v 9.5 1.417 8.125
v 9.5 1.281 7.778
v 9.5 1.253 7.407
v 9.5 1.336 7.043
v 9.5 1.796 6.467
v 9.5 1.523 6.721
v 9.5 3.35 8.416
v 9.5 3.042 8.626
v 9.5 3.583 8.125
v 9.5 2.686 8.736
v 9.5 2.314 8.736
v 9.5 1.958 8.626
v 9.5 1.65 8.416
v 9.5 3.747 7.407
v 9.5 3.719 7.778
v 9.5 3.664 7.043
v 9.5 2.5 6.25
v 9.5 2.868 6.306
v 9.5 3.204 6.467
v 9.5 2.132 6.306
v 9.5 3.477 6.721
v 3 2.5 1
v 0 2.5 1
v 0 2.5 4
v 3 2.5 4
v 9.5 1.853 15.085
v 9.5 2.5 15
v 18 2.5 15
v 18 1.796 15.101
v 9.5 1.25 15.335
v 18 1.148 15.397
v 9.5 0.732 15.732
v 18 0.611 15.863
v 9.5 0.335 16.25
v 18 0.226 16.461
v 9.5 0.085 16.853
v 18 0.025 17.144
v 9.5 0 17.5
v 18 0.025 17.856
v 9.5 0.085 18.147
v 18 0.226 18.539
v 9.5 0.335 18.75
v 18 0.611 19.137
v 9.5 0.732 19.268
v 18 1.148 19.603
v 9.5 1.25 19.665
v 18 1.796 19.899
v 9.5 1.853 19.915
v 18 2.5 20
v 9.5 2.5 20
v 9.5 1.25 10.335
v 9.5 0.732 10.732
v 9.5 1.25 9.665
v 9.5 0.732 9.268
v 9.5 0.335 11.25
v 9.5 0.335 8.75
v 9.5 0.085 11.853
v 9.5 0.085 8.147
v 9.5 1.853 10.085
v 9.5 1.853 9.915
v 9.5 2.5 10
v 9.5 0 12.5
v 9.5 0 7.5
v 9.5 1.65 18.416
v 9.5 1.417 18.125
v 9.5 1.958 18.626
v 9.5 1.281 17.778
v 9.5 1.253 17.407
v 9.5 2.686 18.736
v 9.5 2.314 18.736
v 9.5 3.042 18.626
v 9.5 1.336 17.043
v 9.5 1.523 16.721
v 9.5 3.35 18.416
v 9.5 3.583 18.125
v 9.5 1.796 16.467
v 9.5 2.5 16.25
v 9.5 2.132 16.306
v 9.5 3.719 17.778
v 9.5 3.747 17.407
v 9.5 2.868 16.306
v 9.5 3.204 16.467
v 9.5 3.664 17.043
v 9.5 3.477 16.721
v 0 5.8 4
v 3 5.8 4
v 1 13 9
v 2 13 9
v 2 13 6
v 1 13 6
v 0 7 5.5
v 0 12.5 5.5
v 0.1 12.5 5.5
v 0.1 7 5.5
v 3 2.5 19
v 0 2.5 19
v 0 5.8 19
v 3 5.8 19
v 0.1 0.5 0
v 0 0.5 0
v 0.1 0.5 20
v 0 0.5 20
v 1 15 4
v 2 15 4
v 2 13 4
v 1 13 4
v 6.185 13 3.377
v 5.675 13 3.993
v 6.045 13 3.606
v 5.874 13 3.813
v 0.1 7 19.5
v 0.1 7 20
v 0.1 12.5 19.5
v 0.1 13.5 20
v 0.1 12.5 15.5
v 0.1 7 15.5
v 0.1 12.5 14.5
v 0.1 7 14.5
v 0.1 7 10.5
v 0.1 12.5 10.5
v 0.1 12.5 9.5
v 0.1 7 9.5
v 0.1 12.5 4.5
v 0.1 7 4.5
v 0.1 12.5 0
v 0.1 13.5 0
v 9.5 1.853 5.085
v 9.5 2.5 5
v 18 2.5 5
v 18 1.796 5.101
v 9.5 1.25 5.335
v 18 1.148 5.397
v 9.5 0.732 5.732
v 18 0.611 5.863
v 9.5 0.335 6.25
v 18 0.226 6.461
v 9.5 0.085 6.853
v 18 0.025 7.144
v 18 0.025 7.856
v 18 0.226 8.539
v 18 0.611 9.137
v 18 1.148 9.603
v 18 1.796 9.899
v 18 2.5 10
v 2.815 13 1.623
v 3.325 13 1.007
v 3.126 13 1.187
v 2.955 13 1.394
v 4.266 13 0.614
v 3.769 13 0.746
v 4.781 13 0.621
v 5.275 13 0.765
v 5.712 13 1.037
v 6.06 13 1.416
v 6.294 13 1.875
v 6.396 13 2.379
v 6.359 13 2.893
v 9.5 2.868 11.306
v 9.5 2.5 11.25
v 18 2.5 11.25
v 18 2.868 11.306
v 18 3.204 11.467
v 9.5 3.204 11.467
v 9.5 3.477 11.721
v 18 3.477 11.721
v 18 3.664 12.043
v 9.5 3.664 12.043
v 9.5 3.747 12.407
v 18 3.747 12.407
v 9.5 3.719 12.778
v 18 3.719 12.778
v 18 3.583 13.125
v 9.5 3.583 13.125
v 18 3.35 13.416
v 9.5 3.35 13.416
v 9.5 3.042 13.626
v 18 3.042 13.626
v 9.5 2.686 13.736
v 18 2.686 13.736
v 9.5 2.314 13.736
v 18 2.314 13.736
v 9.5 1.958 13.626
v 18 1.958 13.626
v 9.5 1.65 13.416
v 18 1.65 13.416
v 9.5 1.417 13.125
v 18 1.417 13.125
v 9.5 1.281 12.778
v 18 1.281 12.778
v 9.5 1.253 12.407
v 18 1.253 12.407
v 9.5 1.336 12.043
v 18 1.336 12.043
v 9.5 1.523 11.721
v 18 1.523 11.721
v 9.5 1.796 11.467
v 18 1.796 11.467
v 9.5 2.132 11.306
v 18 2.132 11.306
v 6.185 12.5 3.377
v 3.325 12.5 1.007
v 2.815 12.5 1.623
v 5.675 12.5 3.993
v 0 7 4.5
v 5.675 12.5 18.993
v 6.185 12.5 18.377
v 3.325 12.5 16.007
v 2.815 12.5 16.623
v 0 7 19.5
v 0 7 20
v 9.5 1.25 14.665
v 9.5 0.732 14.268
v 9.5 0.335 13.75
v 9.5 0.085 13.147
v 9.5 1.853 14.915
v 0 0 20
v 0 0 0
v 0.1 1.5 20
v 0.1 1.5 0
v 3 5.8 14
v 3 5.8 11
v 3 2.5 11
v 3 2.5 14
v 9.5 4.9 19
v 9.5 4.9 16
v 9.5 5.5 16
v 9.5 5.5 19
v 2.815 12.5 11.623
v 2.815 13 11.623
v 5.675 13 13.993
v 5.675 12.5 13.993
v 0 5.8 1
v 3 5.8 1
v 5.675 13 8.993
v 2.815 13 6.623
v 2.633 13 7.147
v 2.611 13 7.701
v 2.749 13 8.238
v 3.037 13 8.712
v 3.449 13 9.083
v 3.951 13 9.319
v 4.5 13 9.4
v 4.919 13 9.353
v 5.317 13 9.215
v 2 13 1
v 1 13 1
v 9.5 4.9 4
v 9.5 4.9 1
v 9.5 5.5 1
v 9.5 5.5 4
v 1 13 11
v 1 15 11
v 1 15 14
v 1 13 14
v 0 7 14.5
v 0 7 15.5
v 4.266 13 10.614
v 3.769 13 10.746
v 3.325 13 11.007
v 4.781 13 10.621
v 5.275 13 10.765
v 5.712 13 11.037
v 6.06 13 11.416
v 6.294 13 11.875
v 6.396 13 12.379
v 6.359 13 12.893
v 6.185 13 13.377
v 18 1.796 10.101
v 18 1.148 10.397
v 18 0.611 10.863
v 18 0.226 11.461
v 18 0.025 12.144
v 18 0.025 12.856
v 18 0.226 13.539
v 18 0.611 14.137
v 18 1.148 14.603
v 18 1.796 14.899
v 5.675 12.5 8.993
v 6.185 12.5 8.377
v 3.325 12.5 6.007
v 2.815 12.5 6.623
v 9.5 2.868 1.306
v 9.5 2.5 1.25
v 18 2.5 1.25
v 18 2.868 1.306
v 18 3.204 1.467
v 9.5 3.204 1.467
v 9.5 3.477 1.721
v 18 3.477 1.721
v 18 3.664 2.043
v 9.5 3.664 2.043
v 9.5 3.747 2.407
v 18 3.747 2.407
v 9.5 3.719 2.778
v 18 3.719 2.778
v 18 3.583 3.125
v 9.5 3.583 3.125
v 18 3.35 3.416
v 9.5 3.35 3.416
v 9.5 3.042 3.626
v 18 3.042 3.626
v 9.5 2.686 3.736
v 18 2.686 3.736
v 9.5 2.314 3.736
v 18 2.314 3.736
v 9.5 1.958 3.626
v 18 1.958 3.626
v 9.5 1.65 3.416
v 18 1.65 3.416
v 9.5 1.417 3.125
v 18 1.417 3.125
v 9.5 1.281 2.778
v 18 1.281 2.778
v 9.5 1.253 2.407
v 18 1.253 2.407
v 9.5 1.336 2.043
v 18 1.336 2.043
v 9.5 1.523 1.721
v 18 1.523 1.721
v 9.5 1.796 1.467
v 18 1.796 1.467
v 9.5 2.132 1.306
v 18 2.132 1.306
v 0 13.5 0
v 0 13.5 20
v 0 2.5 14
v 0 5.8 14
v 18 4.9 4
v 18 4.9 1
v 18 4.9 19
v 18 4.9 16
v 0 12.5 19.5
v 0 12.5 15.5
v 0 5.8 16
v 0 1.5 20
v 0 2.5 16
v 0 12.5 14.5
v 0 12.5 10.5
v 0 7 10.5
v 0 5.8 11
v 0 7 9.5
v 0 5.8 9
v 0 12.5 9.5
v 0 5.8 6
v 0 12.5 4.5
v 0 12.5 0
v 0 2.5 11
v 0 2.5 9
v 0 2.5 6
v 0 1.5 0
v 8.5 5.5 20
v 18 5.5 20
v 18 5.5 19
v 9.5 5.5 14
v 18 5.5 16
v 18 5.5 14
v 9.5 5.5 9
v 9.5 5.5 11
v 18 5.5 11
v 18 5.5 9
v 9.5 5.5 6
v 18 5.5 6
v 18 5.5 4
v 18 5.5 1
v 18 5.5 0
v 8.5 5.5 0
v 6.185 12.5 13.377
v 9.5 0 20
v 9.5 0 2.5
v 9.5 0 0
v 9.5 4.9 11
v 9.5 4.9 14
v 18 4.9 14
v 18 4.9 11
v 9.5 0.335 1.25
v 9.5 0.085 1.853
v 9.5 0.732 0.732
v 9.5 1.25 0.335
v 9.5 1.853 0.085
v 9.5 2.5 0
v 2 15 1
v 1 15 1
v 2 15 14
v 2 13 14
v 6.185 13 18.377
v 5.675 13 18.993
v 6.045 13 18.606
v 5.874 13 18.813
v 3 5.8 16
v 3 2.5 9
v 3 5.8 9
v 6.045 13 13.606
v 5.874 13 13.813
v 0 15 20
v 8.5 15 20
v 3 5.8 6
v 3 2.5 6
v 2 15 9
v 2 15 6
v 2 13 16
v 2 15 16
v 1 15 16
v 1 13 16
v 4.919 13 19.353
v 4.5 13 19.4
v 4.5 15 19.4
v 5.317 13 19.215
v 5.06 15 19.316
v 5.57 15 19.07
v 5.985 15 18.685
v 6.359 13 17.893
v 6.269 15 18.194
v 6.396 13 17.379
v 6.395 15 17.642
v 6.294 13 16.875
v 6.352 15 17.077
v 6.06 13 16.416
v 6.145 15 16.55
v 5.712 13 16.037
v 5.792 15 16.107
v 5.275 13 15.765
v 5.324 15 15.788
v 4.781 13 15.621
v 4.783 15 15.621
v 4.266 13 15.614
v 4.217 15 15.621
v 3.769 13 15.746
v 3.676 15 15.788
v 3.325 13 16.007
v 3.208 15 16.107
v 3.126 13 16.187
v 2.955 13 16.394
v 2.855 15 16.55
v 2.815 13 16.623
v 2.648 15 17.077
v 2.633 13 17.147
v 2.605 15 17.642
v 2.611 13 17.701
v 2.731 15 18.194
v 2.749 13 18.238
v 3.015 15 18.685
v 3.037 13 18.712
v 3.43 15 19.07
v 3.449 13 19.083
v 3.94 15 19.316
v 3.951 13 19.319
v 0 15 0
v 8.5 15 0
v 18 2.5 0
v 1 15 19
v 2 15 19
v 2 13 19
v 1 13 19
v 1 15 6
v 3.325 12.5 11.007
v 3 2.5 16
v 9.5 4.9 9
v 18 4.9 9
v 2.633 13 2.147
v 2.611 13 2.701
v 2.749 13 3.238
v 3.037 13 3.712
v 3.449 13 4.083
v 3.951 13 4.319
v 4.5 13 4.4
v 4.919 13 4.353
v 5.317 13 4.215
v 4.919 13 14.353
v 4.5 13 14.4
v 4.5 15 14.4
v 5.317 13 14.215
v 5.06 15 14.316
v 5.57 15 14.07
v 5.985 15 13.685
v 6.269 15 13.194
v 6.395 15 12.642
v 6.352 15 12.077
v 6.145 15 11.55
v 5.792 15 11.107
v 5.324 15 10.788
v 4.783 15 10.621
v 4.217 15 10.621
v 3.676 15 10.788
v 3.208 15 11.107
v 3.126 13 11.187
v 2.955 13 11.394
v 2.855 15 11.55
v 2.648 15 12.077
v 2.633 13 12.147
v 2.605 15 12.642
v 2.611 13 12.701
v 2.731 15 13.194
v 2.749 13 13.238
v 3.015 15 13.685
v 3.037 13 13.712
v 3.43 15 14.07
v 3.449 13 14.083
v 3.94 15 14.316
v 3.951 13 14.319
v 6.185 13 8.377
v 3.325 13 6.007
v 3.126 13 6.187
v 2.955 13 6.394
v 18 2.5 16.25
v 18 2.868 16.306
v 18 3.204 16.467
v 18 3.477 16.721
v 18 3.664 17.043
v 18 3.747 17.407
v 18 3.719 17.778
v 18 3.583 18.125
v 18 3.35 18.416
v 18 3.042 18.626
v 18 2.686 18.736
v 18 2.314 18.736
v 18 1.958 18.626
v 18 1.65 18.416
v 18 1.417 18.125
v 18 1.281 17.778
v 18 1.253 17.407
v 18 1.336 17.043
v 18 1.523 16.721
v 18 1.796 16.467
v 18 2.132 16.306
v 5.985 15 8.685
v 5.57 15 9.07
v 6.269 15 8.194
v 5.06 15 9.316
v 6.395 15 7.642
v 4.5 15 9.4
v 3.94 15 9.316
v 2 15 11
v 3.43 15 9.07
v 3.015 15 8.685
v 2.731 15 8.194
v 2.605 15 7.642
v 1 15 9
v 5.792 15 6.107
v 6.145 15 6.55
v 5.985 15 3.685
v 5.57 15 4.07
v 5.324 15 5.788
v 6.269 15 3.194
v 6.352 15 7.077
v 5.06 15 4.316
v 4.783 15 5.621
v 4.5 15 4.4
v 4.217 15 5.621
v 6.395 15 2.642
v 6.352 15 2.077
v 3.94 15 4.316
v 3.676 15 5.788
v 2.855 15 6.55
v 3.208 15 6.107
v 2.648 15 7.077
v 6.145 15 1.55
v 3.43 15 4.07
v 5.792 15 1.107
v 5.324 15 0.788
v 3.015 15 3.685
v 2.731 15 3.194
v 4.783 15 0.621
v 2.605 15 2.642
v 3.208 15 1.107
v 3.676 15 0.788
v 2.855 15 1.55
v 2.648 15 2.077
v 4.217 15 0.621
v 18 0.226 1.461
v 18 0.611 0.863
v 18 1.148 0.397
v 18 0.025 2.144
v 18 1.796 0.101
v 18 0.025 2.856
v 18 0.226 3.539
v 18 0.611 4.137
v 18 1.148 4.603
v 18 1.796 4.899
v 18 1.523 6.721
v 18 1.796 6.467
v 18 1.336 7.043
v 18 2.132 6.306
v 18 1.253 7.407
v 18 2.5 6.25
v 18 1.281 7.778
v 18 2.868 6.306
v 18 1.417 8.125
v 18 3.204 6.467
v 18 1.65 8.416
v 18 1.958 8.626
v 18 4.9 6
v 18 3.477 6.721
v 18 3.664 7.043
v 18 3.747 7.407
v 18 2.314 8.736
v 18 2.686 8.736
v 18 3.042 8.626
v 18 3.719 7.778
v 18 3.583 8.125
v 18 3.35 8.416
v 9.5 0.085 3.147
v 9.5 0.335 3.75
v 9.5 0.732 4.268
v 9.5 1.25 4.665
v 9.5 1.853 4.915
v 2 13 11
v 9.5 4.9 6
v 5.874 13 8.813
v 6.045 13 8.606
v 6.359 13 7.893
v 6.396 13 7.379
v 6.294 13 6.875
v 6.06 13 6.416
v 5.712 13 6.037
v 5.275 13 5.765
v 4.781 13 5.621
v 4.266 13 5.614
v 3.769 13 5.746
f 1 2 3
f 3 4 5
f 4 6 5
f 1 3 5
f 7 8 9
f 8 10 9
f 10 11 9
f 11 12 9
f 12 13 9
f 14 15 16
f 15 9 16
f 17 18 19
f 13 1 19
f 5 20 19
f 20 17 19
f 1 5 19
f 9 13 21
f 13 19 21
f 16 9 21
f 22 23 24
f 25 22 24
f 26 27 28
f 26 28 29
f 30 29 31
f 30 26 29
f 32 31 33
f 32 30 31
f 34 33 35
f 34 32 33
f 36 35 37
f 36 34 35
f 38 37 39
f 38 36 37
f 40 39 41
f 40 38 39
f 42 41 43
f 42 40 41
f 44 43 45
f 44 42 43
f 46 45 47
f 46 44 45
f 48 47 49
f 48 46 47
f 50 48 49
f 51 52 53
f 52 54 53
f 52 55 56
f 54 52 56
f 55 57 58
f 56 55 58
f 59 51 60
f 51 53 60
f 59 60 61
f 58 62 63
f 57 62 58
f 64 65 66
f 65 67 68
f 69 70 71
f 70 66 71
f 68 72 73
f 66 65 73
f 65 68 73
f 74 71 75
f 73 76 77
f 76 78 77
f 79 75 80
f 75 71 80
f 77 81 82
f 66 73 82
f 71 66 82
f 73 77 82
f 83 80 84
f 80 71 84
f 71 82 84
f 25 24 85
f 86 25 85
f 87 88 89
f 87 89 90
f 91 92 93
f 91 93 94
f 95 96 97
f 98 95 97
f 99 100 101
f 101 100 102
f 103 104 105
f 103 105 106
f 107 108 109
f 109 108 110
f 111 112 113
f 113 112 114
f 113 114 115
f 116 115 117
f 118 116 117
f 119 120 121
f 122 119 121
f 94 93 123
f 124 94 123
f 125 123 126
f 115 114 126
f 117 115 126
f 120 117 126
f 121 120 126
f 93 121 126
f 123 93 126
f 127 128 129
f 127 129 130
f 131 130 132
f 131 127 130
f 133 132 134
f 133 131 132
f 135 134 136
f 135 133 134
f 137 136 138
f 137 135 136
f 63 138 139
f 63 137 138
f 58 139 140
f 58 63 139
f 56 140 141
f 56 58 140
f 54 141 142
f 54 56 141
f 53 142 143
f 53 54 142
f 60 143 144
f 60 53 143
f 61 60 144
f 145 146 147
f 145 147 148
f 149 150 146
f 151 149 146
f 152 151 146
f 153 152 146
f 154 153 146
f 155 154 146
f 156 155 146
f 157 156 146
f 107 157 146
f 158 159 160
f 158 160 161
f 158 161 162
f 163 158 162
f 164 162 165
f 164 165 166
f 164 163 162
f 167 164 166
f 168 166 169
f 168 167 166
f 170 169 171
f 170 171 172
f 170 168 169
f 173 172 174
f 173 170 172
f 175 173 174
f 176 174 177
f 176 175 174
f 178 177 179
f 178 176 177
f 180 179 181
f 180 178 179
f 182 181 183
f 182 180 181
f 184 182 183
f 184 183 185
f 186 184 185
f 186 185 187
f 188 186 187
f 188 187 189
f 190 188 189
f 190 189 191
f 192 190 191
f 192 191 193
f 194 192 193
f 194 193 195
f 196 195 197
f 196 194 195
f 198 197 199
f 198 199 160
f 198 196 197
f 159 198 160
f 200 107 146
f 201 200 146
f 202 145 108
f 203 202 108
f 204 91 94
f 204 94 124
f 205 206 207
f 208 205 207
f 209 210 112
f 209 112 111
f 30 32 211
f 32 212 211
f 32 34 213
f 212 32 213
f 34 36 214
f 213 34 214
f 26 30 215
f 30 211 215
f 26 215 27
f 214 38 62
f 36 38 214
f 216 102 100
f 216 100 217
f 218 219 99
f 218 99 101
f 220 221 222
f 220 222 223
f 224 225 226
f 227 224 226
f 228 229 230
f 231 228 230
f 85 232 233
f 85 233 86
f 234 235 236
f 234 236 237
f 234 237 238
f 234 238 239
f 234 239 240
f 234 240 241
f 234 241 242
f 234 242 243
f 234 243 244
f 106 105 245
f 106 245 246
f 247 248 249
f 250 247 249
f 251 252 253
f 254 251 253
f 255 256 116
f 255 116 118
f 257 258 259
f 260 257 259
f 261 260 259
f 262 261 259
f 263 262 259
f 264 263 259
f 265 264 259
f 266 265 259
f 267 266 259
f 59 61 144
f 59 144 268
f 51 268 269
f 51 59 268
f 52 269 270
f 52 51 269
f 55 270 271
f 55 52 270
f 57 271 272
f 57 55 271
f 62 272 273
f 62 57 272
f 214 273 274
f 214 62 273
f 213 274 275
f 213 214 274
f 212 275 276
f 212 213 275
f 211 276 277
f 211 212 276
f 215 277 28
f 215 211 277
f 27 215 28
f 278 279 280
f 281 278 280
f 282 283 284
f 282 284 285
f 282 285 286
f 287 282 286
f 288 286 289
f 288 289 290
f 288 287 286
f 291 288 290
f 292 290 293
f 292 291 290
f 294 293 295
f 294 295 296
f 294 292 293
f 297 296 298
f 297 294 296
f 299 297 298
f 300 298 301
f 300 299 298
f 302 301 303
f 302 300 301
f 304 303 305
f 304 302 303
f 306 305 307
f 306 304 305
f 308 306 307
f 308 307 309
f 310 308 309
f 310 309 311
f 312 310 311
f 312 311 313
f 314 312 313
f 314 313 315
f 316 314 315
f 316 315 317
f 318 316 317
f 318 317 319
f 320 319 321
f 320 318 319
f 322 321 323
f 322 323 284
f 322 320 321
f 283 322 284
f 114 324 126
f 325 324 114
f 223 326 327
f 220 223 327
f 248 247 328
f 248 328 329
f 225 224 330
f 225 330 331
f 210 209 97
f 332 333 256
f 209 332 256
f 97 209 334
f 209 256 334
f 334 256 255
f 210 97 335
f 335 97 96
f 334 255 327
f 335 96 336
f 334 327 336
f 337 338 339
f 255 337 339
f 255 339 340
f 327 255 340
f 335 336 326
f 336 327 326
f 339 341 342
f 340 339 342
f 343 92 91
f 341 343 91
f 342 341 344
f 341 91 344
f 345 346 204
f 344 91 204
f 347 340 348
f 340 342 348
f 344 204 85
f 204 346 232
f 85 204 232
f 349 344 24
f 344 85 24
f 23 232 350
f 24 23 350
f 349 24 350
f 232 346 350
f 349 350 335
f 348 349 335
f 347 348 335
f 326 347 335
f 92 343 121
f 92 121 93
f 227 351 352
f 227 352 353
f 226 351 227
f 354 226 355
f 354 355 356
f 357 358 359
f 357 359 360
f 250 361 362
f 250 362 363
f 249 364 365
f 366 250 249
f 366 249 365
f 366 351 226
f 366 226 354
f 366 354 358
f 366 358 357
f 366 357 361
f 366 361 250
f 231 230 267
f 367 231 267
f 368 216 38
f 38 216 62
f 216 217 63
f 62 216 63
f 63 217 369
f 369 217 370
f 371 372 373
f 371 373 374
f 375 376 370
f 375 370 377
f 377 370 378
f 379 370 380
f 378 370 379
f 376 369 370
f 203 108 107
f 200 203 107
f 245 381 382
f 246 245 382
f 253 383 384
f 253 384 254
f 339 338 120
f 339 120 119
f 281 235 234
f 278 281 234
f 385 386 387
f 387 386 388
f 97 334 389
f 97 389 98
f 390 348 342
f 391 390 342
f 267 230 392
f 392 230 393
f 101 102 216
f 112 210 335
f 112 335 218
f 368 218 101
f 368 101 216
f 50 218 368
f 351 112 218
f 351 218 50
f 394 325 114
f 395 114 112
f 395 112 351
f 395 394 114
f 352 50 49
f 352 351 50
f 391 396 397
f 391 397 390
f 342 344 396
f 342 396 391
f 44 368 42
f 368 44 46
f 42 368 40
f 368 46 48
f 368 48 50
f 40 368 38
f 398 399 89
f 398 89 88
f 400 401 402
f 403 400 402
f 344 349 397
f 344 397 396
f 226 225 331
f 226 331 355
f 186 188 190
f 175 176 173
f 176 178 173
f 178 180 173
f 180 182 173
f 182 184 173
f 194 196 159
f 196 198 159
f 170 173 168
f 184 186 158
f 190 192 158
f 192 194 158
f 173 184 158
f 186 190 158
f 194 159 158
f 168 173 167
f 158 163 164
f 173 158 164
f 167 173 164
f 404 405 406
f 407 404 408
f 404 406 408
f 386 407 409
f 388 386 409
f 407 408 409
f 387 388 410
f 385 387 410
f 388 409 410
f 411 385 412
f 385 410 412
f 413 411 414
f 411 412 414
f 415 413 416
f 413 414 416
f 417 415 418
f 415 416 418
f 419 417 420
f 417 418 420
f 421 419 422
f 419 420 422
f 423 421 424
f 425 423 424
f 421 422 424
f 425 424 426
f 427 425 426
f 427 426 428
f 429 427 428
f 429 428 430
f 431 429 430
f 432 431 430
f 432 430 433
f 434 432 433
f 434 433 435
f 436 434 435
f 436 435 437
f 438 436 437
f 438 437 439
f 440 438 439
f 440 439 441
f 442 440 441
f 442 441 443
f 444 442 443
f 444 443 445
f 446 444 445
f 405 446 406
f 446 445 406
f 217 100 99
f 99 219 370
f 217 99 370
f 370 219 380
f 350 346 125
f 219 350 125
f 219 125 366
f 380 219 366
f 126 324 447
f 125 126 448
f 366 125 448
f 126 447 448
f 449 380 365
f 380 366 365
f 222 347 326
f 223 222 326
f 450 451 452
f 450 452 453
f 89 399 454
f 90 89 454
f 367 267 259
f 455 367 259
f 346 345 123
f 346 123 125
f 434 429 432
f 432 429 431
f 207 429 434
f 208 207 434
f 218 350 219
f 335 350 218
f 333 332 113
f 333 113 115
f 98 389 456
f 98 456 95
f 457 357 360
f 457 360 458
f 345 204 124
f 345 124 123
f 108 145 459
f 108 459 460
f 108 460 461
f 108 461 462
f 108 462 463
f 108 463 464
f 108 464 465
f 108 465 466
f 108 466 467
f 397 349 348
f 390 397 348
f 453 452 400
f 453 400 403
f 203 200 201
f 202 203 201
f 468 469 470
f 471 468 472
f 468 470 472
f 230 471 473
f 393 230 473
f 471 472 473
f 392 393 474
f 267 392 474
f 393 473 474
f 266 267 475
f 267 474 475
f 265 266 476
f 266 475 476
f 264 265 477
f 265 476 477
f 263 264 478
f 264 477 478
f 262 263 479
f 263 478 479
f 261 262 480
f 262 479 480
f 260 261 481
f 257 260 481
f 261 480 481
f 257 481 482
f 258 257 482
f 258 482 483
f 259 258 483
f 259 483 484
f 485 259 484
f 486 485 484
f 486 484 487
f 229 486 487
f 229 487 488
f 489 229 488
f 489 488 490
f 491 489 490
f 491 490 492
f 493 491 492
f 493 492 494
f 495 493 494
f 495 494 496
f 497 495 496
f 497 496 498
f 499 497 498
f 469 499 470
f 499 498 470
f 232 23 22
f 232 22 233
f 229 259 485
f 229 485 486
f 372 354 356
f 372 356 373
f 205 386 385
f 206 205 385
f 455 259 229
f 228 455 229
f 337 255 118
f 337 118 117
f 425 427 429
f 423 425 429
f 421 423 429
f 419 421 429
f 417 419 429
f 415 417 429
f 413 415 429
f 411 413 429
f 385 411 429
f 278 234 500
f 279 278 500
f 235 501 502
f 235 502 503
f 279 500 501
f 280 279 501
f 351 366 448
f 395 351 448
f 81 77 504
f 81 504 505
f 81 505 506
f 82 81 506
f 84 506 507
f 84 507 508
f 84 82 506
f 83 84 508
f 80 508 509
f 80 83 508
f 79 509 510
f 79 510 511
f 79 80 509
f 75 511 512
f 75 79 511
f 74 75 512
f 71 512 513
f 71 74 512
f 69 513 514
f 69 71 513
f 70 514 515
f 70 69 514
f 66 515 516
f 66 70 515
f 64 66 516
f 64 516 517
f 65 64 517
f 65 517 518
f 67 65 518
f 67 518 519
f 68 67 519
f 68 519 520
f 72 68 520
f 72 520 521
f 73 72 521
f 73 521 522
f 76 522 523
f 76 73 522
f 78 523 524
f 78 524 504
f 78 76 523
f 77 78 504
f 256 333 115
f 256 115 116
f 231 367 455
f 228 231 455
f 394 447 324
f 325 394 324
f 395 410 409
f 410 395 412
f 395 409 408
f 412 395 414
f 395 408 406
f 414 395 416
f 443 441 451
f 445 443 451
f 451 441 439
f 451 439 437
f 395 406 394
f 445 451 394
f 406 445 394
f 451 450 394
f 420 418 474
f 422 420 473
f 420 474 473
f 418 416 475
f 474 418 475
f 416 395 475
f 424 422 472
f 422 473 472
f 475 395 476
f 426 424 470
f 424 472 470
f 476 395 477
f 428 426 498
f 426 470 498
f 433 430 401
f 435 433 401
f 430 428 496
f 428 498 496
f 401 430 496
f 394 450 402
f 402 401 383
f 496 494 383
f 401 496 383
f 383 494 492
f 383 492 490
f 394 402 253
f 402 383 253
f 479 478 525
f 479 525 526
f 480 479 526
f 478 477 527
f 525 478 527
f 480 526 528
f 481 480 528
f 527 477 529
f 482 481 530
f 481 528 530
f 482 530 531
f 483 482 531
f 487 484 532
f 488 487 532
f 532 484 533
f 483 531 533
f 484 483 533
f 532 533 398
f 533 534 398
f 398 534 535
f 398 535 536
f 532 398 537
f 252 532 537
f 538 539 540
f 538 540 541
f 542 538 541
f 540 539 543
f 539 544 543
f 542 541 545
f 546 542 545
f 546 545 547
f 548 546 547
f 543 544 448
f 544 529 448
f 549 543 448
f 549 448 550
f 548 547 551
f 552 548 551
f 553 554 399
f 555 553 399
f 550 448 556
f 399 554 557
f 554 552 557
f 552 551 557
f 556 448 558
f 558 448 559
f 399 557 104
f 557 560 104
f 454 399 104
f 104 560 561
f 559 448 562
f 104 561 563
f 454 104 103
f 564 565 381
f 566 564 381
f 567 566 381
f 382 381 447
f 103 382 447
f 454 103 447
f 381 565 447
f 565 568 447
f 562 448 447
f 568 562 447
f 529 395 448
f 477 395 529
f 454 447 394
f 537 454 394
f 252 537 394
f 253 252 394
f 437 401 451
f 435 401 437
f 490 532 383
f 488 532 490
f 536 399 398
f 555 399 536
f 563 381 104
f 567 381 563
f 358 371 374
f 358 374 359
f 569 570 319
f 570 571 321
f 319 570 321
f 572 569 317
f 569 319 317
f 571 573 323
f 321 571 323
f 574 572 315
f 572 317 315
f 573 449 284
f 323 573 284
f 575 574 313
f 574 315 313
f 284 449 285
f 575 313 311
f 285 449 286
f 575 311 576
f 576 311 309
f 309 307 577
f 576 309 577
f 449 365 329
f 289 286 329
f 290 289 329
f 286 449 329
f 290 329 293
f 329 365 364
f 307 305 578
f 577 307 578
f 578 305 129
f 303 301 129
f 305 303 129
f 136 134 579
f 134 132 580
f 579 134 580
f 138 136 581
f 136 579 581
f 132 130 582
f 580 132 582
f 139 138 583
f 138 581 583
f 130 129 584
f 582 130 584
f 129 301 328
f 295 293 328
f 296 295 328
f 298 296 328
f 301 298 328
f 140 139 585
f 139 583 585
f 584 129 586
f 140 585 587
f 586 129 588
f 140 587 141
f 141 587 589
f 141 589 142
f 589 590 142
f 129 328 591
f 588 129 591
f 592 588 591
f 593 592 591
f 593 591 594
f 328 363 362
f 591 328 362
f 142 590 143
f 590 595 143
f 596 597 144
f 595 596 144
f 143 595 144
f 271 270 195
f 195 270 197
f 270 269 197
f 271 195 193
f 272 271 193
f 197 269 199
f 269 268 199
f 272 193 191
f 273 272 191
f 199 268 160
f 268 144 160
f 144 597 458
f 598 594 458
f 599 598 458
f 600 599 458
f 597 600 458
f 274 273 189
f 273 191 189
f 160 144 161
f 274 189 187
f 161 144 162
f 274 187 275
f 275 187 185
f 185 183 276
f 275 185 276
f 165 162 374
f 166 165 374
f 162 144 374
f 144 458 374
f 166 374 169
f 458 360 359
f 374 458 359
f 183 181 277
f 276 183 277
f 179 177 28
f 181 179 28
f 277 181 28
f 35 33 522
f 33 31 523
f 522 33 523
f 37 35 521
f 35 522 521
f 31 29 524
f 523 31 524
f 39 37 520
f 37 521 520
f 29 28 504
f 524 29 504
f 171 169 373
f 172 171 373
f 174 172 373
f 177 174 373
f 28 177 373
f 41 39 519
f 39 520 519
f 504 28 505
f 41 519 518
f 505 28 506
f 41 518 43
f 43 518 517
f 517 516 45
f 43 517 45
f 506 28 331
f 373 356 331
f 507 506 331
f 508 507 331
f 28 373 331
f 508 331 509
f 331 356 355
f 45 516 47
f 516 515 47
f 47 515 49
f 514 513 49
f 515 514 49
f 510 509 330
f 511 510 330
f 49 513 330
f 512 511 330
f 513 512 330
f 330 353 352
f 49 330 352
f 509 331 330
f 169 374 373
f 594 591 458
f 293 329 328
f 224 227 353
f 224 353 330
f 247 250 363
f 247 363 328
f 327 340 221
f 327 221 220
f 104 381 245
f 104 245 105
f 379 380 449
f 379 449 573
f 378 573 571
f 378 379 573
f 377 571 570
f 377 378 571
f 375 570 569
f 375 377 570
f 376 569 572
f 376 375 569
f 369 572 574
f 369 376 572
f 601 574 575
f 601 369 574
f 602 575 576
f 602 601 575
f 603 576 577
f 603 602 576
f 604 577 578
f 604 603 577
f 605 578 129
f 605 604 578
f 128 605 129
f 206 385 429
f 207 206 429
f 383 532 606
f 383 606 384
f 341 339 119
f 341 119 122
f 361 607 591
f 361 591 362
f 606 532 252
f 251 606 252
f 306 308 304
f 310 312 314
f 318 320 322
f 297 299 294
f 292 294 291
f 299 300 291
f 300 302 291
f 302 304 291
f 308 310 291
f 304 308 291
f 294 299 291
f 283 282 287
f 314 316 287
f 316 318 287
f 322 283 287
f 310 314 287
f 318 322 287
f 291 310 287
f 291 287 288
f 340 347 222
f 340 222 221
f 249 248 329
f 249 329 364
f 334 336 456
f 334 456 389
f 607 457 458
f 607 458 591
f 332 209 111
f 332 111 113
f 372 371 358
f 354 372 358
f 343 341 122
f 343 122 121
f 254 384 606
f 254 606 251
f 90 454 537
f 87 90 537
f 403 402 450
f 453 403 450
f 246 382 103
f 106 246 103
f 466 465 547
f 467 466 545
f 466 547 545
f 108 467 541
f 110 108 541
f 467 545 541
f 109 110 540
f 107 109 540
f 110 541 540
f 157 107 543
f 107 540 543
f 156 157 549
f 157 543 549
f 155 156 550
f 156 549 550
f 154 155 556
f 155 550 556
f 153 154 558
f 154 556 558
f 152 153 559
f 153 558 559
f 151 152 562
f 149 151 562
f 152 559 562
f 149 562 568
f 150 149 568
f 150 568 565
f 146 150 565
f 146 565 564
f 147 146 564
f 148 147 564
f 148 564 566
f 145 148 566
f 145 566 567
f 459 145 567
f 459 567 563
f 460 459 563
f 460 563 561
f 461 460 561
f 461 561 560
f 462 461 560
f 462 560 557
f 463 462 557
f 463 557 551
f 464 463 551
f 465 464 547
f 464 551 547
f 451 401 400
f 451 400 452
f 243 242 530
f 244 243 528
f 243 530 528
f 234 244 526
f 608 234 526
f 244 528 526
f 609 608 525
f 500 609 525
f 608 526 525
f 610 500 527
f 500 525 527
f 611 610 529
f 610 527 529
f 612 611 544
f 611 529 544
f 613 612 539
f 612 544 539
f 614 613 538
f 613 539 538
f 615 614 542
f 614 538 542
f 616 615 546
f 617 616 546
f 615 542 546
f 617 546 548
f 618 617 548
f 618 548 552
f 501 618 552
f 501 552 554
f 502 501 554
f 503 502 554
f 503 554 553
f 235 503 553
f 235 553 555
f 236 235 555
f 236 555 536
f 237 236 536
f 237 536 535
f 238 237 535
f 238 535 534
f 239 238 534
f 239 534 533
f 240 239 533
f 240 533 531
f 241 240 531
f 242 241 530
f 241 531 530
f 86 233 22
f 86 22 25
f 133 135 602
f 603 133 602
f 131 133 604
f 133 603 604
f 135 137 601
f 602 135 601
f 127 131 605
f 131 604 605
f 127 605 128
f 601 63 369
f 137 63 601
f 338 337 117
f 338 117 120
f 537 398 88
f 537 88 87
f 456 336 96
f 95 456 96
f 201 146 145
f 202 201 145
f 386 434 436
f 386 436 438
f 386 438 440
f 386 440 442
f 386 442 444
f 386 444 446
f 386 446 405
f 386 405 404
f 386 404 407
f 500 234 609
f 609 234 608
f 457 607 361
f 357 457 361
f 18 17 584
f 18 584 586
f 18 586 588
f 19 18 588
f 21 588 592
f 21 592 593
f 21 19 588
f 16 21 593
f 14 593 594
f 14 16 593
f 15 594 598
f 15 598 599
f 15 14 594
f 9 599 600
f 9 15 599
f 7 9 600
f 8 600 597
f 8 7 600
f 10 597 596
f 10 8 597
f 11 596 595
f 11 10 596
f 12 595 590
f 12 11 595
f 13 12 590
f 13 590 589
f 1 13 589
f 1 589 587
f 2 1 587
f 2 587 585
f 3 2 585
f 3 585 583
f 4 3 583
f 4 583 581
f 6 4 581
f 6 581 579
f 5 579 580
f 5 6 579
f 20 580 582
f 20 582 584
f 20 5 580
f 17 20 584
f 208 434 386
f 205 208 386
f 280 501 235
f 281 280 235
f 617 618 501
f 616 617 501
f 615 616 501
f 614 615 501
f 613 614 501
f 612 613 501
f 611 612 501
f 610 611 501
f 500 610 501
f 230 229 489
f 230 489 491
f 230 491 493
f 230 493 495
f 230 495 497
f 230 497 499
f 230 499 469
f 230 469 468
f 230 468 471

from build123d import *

# Parameters (mm, degrees)
EXTRUDE_1_DEPTH        = 25
SKETCH_2_R             = 1.25
EXTRUDE_2_DEPTH        = 8.5
PATTERN_LINEAR_1_COUNT = 5
PATTERN_LINEAR_1_PITCH = 5
SKETCH_3_W             = 3
SKETCH_3_H             = 3.3
CUT_EXTRUDE_1_DEPTH    = 3
PATTERN_LINEAR_2_COUNT = 5
PATTERN_LINEAR_2_PITCH = 5
CUT_EXTRUDE_2_DEPTH    = 0.1
SKETCH_5_W             = 25
SKETCH_5_H             = 1
CUT_EXTRUDE_3_DEPTH    = 0.1
SKETCH_6_R             = 1.9
CUT_EXTRUDE_4_DEPTH    = 2
PATTERN_LINEAR_3_COUNT = 5
PATTERN_LINEAR_3_PITCH = 5
SKETCH_7_W             = 1
SKETCH_7_H             = 3
CUT_EXTRUDE_5_DEPTH    = 2
PATTERN_LINEAR_4_COUNT = 5
PATTERN_LINEAR_4_PITCH = 5
CUT_EXTRUDE_6_DEPTH    = 0.5
PATTERN_LINEAR_5_COUNT = 5
PATTERN_LINEAR_5_PITCH = 5
SKETCH_9_W             = 18
SKETCH_9_H             = 15
CUT_EXTRUDE_7_DEPTH    = 5


with BuildPart() as part:
    # Эскиз1 → Вытянуть1 (new body)
    with BuildSketch(Plane.XY):
        Polygon((0, 0), (9.5, 0), (9.5, 5.5), (8.5, 5.5), (8.5, 15), (0, 15), align=None)
    extrude(amount=EXTRUDE_1_DEPTH)

    # Эскиз2 → Вытянуть2 (add)
    with BuildSketch(Plane(origin=(9.5, 0, 0), x_dir=(0, 0, -1), z_dir=(1, 0, 0))):
        with BuildLine():
            Line((-25, 5.5), (-24, 5.5))
            Line((-24, 5.5), (-24, 4.9))
            Line((-24, 4.9), (-21, 4.9))
            Line((-21, 4.9), (-21, 5.5))
            Line((-21, 5.5), (-20, 5.5))
            Line((-20, 5.5), (-20, 2.5))
            ThreePointArc((-20, 2.5), (-22.5, 0), (-25, 2.5))
            Line((-25, 2.5), (-25, 5.5))
        make_face()
        with Locations((-22.5, 2.5)):
            Circle(SKETCH_2_R, mode=Mode.SUBTRACT)
    extrude_2 = extrude(amount=EXTRUDE_2_DEPTH)

    # Линейный массив1: Вытянуть2 ×5
    with Locations(*[(0, 0, -i * PATTERN_LINEAR_1_PITCH) for i in range(1, PATTERN_LINEAR_1_COUNT)]):
        add(extrude_2)

    # Эскиз3 → Вырез-Вытянуть1 (cut)
    with BuildSketch(Plane.ZY):
        with Locations((2.5, 4.15)):
            Rectangle(SKETCH_3_W, SKETCH_3_H)
    cut_extrude_1 = extrude(amount=-CUT_EXTRUDE_1_DEPTH, mode=Mode.SUBTRACT)

    # Линейный массив2: Вырез-Вытянуть1 ×5
    with Locations(*[(0, 0, i * PATTERN_LINEAR_2_PITCH) for i in range(1, PATTERN_LINEAR_2_COUNT)]):
        add(cut_extrude_1, mode=Mode.SUBTRACT)

    # Эскиз4 → Вырез-Вытянуть2 (cut)
    with BuildSketch(Plane.ZY):
        Polygon((0, 13.5), (25, 13.5), (25, 12.5), (25.5, 12.5), (25.5, 7), (24.5, 7), (24.5, 12.5), (20.5, 12.5), (20.5, 7), (19.5, 7), (19.5, 12.5), (15.5, 12.5), (15.5, 7), (14.5, 7), (14.5, 12.5), (10.5, 12.5), (10.5, 7), (9.5, 7), (9.5, 12.5), (5.5, 12.5), (5.5, 7), (4.5, 7), (4.5, 12.5), (0, 12.5), align=None)
    extrude(amount=-CUT_EXTRUDE_2_DEPTH, mode=Mode.SUBTRACT)

    # Эскиз5 → Вырез-Вытянуть3 (cut)
    with BuildSketch(Plane.ZY):
        with Locations((12.5, 1)):
            Rectangle(SKETCH_5_W, SKETCH_5_H)
    extrude(amount=-CUT_EXTRUDE_3_DEPTH, mode=Mode.SUBTRACT)

    # Эскиз6 → Вырез-Вытянуть4 (cut)
    with BuildSketch(Plane(origin=(0, 15, 0), x_dir=(-1, 0, 0), z_dir=(0, 1, 0))):
        with Locations(Location((-4.5, 2.5, 0), (0, 0, 90))):
            Circle(SKETCH_6_R)
    cut_extrude_4 = extrude(amount=-CUT_EXTRUDE_4_DEPTH, mode=Mode.SUBTRACT)

    # Линейный массив3: Вырез-Вытянуть4 ×5
    with Locations(*[(0, 0, i * PATTERN_LINEAR_3_PITCH) for i in range(1, PATTERN_LINEAR_3_COUNT)]):
        add(cut_extrude_4, mode=Mode.SUBTRACT)

    # Эскиз7 → Вырез-Вытянуть5 (cut)
    with BuildSketch(Plane(origin=(0, 15, 0), x_dir=(-1, 0, 0), z_dir=(0, 1, 0))):
        with Locations((-1.5, 2.5)):
            Rectangle(SKETCH_7_W, SKETCH_7_H)
    cut_extrude_5 = extrude(amount=-CUT_EXTRUDE_5_DEPTH, mode=Mode.SUBTRACT)

    # Линейный массив4: Вырез-Вытянуть5 ×5
    with Locations(*[(0, 0, i * PATTERN_LINEAR_4_PITCH) for i in range(1, PATTERN_LINEAR_4_COUNT)]):
        add(cut_extrude_5, mode=Mode.SUBTRACT)

    # Эскиз8 → Вырез-Вытянуть6 (cut)
    with BuildSketch(Plane(origin=(0, 13, 0), x_dir=(-1, 0, 0), z_dir=(0, 1, 0))):
        Polygon((-6.185425231, 3.377121309), (-3.325012579, 1.006880929), (-2.814574769, 1.622878691), (-5.674987421, 3.993119071), align=None)
    cut_extrude_6 = extrude(amount=-CUT_EXTRUDE_6_DEPTH, mode=Mode.SUBTRACT)

    # Линейный массив5: Вырез-Вытянуть6 ×5
    with Locations(*[(0, 0, i * PATTERN_LINEAR_5_PITCH) for i in range(1, PATTERN_LINEAR_5_COUNT)]):
        add(cut_extrude_6, mode=Mode.SUBTRACT)

    # Эскиз9 → Вырез-Вытянуть7 (cut)
    with BuildSketch(Plane.XY.offset(25)):
        with Locations((9, 7.5)):
            Rectangle(SKETCH_9_W, SKETCH_9_H)
    extrude(amount=-CUT_EXTRUDE_7_DEPTH, mode=Mode.SUBTRACT)


solid = part.part
